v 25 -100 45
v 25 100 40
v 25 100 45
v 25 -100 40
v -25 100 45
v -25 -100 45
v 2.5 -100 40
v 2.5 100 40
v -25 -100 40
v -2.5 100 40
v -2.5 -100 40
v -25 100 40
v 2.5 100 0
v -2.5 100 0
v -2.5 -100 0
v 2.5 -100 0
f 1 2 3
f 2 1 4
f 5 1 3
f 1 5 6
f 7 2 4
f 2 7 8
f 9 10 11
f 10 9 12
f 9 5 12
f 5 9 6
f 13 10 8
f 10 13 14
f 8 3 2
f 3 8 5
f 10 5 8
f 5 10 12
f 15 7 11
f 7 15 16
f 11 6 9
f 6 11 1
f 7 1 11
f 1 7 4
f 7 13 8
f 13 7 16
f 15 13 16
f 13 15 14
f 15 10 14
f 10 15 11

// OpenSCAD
// Beam dimensions
beam_length = 200; // Overall length of the T-beam

// Flange dimensions (the top horizontal part of the 'T')
flange_width = 50;      // Width of the top flange
flange_thickness = 5;   // Thickness of the top flange

// Web dimensions (the vertical part of the 'T')
web_height = 40;        // Height of the vertical web (excluding flange thickness)
web_thickness = 5;      // Thickness of the vertical web

// Module to create a T-section beam
// The origin [0,0,0] is at the bottom center of the web.
module t_section_beam(length, f_width, f_thickness, w_height, w_thickness) {
    union() {
        // Create the flange (top horizontal part)
        // Positioned on top of the web, centered horizontally along X and Y axes.
        translate([-f_width / 2, -length / 2, w_height]) {
            cube([f_width, length, f_thickness]);
        }

        // Create the web (vertical part)
        // Positioned from the bottom (z=0), centered horizontally along X and Y axes.
        translate([-w_thickness / 2, -length / 2, 0]) {
            cube([w_thickness, length, w_height]);
        }
    }
}

// Instantiate the T-section beam with the defined parameters
t_section_beam(beam_length, flange_width, flange_thickness, web_height, web_thickness);
